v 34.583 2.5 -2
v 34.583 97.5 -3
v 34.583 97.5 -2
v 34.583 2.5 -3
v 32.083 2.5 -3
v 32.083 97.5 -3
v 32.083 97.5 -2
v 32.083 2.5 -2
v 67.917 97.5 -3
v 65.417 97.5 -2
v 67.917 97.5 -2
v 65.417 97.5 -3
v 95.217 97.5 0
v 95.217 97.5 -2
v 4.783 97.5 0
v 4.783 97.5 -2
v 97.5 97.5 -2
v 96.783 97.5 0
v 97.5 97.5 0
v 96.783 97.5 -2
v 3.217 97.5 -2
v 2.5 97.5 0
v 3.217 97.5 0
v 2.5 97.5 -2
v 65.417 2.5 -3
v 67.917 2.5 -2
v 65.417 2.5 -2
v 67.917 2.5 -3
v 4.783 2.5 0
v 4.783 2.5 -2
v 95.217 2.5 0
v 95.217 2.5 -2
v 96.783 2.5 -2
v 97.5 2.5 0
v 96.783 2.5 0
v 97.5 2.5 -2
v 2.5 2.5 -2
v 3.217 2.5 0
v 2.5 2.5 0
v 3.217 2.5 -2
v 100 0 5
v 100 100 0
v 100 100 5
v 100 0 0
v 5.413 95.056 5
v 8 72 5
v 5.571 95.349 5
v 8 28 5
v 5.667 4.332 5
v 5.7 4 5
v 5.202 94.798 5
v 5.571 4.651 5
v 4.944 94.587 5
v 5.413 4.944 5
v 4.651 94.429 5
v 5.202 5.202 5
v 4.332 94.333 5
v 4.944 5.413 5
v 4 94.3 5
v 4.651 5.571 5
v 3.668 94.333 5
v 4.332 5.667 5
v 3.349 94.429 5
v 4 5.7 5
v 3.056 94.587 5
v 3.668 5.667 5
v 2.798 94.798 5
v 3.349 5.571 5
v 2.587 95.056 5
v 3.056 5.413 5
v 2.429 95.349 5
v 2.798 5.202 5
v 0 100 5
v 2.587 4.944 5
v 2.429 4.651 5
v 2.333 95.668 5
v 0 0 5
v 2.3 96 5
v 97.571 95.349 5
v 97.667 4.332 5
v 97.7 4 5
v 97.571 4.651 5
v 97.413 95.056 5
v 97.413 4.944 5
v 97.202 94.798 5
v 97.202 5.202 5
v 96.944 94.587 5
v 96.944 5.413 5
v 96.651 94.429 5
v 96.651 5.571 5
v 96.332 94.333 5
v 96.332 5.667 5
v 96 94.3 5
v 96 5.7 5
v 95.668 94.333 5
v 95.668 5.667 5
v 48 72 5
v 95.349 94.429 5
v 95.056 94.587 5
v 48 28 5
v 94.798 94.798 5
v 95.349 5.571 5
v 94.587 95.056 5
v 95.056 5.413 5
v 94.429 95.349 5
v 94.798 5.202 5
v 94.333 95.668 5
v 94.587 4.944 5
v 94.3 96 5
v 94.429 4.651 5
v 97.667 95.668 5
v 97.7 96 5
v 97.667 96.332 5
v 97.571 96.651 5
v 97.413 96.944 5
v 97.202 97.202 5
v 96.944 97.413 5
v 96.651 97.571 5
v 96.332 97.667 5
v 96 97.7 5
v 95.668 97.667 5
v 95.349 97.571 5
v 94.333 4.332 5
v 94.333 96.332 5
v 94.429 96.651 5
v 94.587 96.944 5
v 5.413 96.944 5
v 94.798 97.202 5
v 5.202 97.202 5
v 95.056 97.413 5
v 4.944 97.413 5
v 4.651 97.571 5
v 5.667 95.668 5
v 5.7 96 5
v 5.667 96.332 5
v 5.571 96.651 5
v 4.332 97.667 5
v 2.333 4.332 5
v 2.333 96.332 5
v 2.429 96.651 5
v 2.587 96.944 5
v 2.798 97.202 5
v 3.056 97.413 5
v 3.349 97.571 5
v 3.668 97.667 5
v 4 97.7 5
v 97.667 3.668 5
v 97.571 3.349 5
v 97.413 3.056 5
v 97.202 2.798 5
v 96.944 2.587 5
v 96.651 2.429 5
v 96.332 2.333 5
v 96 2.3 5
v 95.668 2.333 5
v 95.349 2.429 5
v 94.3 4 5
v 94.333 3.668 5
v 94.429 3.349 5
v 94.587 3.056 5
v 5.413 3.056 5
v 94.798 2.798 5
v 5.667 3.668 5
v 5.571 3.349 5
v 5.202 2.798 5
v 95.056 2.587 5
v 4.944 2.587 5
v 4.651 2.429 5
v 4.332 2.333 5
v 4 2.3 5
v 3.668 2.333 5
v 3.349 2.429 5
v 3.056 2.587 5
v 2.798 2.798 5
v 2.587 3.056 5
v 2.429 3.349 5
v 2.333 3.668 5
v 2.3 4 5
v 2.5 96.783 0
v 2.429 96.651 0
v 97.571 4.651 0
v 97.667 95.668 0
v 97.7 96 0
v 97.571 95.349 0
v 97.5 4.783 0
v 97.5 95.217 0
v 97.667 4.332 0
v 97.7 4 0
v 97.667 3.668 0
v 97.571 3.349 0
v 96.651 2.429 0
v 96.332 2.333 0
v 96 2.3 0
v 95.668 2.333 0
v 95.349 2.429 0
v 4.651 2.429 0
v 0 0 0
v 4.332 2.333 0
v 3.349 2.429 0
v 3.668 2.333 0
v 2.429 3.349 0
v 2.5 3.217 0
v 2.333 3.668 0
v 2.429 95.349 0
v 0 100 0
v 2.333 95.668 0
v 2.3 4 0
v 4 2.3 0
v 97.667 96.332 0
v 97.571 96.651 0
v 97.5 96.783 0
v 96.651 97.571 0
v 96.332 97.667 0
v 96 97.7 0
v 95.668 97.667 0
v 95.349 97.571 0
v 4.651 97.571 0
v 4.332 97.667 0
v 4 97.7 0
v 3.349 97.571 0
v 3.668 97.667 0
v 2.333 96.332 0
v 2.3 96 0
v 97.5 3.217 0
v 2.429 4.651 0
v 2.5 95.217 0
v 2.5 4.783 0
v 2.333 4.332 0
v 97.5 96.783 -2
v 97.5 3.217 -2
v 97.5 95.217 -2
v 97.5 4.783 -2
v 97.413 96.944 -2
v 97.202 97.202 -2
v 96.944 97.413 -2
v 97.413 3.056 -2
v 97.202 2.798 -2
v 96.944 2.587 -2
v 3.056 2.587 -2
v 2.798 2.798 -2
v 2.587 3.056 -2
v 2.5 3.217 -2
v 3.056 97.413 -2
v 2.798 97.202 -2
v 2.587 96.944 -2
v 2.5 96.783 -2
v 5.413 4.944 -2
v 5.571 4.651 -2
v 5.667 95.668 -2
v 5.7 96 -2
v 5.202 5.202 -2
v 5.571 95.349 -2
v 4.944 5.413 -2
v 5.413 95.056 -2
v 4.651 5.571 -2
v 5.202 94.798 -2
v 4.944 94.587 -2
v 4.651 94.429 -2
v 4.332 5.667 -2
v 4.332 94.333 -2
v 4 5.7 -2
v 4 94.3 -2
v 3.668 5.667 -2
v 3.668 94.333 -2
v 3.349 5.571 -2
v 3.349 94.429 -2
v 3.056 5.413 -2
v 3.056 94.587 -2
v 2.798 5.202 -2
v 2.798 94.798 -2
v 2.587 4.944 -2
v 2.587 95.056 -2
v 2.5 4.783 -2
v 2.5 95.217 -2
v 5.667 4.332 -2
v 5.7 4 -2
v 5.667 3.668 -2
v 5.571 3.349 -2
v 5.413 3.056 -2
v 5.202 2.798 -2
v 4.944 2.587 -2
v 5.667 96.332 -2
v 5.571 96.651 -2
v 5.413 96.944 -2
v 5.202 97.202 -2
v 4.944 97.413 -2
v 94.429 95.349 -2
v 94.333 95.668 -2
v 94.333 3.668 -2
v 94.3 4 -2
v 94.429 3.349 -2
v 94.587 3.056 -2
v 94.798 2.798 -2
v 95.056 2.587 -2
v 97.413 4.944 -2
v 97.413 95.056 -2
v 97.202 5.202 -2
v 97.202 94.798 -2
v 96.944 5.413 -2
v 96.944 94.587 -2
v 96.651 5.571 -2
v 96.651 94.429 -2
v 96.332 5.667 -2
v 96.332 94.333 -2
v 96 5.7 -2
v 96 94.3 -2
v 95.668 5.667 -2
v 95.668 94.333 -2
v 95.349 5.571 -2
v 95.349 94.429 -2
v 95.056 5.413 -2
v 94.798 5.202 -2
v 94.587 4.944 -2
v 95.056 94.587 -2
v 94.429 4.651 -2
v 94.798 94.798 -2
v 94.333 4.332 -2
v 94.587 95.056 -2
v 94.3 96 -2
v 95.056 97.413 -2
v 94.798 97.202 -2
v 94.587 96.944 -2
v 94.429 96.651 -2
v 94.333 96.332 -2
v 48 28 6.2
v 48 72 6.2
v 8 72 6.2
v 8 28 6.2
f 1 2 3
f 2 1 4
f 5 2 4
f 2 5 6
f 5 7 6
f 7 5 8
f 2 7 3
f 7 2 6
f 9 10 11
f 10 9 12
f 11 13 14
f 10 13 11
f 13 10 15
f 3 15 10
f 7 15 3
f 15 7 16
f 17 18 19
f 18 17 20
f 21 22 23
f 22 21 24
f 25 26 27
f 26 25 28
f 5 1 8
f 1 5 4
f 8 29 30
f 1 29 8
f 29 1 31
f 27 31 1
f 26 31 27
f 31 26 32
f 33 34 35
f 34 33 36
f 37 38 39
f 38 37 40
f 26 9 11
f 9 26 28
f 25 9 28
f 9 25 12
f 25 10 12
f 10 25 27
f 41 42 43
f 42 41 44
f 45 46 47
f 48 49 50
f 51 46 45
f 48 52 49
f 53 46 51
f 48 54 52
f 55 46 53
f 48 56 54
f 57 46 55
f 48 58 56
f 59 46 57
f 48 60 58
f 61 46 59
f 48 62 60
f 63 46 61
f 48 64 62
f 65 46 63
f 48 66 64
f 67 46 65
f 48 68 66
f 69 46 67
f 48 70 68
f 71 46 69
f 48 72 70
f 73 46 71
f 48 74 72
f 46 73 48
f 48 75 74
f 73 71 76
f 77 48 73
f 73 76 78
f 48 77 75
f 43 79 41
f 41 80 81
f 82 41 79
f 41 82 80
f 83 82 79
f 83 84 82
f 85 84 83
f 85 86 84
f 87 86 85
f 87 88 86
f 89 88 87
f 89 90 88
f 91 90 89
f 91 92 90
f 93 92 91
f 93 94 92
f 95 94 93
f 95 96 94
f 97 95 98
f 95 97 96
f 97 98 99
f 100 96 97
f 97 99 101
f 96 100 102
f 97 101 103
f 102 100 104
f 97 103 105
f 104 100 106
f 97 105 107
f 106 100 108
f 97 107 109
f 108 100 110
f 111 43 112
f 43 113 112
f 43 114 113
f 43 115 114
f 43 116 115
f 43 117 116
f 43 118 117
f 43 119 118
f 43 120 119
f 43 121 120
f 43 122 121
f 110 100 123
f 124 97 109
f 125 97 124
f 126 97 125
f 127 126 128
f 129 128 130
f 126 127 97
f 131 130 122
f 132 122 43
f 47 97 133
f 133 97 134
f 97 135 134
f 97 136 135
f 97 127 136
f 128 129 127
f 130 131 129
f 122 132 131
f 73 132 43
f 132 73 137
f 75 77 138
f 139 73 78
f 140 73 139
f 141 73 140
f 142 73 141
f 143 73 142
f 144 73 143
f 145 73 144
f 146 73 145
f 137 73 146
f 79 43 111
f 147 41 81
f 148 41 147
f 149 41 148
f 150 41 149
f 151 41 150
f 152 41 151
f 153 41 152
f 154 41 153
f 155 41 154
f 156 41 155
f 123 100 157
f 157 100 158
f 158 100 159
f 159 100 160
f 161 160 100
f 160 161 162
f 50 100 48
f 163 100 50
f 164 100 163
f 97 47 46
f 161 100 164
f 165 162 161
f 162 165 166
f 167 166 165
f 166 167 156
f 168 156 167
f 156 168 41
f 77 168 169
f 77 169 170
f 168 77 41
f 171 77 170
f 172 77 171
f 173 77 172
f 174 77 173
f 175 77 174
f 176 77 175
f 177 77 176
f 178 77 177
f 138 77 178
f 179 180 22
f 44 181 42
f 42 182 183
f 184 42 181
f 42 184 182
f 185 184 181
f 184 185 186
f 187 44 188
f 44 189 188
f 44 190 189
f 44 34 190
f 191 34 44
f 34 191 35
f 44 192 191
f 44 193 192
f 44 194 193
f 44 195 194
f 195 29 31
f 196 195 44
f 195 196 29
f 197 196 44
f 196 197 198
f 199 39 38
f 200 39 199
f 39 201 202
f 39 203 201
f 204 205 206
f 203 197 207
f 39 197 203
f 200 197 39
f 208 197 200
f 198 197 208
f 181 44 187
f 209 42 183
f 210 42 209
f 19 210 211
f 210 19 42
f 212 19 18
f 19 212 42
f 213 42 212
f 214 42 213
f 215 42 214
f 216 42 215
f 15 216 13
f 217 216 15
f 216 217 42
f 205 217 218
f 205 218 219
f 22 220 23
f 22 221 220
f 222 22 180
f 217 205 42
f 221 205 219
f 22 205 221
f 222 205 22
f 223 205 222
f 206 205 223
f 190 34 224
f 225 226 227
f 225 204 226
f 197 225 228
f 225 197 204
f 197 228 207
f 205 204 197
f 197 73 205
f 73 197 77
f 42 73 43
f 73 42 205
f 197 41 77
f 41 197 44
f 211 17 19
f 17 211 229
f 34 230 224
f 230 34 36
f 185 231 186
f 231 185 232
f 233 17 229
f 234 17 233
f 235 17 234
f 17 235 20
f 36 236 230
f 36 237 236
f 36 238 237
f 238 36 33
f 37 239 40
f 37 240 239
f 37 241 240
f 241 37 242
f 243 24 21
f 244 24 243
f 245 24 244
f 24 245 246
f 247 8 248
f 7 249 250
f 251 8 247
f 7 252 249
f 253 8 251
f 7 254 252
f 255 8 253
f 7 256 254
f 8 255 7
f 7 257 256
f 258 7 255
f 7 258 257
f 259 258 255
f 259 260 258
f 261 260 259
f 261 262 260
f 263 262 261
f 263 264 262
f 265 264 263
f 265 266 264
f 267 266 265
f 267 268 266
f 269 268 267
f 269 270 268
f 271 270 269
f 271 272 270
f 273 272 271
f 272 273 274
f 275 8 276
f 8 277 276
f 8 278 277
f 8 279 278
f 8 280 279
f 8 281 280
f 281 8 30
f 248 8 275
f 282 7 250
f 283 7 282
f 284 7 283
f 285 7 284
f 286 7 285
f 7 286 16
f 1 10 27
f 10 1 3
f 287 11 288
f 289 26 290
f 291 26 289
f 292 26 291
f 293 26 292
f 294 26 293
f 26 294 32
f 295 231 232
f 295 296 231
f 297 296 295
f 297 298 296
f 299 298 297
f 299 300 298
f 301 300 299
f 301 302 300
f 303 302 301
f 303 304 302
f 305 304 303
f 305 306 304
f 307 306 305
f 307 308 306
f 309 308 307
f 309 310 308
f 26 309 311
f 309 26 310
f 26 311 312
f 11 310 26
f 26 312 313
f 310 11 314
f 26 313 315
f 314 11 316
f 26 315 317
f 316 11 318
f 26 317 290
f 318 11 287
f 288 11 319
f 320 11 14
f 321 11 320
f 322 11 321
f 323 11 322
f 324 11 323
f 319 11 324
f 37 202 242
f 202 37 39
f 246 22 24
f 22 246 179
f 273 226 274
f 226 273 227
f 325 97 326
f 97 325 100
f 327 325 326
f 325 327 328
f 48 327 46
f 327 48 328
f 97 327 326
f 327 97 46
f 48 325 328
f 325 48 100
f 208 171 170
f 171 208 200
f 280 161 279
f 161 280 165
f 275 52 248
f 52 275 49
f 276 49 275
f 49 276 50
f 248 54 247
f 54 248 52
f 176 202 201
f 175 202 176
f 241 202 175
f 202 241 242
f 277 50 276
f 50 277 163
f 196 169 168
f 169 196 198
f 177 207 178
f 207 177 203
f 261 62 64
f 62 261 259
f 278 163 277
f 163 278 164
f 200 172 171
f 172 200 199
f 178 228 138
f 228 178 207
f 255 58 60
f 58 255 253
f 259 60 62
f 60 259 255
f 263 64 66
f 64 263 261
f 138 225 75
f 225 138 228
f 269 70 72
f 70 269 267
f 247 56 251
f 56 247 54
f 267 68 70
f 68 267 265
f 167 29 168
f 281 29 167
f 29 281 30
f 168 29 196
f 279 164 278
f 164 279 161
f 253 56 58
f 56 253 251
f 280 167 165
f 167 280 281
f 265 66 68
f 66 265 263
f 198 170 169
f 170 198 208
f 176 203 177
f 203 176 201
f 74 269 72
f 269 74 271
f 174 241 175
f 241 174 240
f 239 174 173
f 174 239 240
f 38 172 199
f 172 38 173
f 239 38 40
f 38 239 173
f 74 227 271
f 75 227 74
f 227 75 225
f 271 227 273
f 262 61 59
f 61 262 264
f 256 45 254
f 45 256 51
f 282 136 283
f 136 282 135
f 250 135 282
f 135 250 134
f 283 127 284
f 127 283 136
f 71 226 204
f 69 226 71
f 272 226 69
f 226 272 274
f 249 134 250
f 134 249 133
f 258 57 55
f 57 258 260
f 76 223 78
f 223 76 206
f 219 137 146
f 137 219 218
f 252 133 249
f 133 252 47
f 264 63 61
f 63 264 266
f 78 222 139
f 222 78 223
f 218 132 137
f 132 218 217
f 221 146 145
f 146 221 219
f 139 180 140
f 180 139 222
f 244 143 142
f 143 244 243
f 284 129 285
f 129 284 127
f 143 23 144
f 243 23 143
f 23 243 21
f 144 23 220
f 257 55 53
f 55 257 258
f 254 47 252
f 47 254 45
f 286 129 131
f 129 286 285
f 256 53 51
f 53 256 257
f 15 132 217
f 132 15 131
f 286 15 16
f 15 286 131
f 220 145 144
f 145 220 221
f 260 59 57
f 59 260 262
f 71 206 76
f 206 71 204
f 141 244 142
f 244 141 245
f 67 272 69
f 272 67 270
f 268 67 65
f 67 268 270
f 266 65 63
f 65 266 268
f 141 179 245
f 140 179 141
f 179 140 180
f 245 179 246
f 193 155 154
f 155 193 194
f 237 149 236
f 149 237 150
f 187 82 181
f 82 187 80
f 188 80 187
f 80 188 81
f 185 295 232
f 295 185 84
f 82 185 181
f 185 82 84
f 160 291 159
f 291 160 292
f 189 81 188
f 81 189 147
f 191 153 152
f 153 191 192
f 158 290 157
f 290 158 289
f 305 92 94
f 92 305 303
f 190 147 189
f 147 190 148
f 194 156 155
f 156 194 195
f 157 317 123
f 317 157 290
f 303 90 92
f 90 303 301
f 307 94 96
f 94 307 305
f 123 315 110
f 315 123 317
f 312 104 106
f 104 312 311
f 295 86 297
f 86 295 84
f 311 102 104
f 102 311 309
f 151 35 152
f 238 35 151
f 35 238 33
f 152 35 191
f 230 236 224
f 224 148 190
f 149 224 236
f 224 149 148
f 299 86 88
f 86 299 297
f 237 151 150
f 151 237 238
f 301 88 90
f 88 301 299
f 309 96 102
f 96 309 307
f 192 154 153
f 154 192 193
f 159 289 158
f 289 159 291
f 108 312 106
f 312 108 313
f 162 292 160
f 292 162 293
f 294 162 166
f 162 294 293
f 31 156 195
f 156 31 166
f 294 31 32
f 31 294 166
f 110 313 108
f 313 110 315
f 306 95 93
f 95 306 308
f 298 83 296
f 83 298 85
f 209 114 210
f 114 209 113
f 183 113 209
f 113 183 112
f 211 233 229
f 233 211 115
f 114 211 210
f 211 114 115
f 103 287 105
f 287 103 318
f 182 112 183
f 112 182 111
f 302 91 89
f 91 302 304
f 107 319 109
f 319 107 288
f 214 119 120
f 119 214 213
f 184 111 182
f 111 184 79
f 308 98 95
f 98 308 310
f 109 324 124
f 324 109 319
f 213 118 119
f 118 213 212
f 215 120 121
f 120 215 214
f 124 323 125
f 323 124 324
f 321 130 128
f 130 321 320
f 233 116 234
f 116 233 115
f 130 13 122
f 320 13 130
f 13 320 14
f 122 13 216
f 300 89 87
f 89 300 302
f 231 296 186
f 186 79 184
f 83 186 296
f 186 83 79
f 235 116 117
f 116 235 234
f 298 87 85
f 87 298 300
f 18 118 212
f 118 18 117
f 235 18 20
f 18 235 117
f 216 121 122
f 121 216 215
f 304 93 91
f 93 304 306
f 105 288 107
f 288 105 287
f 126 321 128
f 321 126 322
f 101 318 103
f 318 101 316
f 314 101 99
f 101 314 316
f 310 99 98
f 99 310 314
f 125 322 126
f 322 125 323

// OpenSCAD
$fn = 32;

// ----------------------------------------------------------------------
// Enclosure lid: 100 x 100 x 5 mm, 4 bolt holes
// ----------------------------------------------------------------------

// --- parameters (mm) ---
length = 100;             // lid length, X
width = 100;              // lid width, Y
plate_t = 5;              // lid plate thickness
bolt_d = 3.4;             // bolt clearance
boss_lip = 4;             // bolt hole inset from the corner
sink = 1;                 // overlap of the lip and ribs into the plate
lip_h = 3;                // lip height below the plate
lip_wall = 2.5;           // lip wall thickness
rib_n = 2;                // stiffening ribs
rib_t = 2.5;              // rib thickness
rib_h = 4;                // rib height below the plate
label_h = 1.2;            // raised marking pad

module plate() {
  cube([length, width, plate_t]);
  /* lip that drops into the housing opening, sunk into the plate */
  translate([lip_wall, lip_wall, -lip_h + sink]) cube([length - 2 * lip_wall, width - 2 * lip_wall, lip_h]);
  /* stiffening ribs under the plate */
  for (i = [1 : rib_n]) translate([length * i / (rib_n + 1) - rib_t / 2, lip_wall, -rib_h + sink]) cube([rib_t, width - 2 * lip_wall, rib_h]);
  /* raised marking pad on top, sunk 1 mm into the plate */
  translate([length * 0.08, width * 0.28, plate_t - 1]) cube([length * 0.4, width * 0.44, label_h + 1]);
}

difference() {
  plate();
  /* bolt pattern matching the corner bosses */
  for (sx = [0, 1]) for (sy = [0, 1])
    translate([sx * (length - 2 * boss_lip) + boss_lip, sy * (width - 2 * boss_lip) + boss_lip, -lip_h - 1])
      cylinder(h = plate_t + lip_h + 2, d = bolt_d);
}
